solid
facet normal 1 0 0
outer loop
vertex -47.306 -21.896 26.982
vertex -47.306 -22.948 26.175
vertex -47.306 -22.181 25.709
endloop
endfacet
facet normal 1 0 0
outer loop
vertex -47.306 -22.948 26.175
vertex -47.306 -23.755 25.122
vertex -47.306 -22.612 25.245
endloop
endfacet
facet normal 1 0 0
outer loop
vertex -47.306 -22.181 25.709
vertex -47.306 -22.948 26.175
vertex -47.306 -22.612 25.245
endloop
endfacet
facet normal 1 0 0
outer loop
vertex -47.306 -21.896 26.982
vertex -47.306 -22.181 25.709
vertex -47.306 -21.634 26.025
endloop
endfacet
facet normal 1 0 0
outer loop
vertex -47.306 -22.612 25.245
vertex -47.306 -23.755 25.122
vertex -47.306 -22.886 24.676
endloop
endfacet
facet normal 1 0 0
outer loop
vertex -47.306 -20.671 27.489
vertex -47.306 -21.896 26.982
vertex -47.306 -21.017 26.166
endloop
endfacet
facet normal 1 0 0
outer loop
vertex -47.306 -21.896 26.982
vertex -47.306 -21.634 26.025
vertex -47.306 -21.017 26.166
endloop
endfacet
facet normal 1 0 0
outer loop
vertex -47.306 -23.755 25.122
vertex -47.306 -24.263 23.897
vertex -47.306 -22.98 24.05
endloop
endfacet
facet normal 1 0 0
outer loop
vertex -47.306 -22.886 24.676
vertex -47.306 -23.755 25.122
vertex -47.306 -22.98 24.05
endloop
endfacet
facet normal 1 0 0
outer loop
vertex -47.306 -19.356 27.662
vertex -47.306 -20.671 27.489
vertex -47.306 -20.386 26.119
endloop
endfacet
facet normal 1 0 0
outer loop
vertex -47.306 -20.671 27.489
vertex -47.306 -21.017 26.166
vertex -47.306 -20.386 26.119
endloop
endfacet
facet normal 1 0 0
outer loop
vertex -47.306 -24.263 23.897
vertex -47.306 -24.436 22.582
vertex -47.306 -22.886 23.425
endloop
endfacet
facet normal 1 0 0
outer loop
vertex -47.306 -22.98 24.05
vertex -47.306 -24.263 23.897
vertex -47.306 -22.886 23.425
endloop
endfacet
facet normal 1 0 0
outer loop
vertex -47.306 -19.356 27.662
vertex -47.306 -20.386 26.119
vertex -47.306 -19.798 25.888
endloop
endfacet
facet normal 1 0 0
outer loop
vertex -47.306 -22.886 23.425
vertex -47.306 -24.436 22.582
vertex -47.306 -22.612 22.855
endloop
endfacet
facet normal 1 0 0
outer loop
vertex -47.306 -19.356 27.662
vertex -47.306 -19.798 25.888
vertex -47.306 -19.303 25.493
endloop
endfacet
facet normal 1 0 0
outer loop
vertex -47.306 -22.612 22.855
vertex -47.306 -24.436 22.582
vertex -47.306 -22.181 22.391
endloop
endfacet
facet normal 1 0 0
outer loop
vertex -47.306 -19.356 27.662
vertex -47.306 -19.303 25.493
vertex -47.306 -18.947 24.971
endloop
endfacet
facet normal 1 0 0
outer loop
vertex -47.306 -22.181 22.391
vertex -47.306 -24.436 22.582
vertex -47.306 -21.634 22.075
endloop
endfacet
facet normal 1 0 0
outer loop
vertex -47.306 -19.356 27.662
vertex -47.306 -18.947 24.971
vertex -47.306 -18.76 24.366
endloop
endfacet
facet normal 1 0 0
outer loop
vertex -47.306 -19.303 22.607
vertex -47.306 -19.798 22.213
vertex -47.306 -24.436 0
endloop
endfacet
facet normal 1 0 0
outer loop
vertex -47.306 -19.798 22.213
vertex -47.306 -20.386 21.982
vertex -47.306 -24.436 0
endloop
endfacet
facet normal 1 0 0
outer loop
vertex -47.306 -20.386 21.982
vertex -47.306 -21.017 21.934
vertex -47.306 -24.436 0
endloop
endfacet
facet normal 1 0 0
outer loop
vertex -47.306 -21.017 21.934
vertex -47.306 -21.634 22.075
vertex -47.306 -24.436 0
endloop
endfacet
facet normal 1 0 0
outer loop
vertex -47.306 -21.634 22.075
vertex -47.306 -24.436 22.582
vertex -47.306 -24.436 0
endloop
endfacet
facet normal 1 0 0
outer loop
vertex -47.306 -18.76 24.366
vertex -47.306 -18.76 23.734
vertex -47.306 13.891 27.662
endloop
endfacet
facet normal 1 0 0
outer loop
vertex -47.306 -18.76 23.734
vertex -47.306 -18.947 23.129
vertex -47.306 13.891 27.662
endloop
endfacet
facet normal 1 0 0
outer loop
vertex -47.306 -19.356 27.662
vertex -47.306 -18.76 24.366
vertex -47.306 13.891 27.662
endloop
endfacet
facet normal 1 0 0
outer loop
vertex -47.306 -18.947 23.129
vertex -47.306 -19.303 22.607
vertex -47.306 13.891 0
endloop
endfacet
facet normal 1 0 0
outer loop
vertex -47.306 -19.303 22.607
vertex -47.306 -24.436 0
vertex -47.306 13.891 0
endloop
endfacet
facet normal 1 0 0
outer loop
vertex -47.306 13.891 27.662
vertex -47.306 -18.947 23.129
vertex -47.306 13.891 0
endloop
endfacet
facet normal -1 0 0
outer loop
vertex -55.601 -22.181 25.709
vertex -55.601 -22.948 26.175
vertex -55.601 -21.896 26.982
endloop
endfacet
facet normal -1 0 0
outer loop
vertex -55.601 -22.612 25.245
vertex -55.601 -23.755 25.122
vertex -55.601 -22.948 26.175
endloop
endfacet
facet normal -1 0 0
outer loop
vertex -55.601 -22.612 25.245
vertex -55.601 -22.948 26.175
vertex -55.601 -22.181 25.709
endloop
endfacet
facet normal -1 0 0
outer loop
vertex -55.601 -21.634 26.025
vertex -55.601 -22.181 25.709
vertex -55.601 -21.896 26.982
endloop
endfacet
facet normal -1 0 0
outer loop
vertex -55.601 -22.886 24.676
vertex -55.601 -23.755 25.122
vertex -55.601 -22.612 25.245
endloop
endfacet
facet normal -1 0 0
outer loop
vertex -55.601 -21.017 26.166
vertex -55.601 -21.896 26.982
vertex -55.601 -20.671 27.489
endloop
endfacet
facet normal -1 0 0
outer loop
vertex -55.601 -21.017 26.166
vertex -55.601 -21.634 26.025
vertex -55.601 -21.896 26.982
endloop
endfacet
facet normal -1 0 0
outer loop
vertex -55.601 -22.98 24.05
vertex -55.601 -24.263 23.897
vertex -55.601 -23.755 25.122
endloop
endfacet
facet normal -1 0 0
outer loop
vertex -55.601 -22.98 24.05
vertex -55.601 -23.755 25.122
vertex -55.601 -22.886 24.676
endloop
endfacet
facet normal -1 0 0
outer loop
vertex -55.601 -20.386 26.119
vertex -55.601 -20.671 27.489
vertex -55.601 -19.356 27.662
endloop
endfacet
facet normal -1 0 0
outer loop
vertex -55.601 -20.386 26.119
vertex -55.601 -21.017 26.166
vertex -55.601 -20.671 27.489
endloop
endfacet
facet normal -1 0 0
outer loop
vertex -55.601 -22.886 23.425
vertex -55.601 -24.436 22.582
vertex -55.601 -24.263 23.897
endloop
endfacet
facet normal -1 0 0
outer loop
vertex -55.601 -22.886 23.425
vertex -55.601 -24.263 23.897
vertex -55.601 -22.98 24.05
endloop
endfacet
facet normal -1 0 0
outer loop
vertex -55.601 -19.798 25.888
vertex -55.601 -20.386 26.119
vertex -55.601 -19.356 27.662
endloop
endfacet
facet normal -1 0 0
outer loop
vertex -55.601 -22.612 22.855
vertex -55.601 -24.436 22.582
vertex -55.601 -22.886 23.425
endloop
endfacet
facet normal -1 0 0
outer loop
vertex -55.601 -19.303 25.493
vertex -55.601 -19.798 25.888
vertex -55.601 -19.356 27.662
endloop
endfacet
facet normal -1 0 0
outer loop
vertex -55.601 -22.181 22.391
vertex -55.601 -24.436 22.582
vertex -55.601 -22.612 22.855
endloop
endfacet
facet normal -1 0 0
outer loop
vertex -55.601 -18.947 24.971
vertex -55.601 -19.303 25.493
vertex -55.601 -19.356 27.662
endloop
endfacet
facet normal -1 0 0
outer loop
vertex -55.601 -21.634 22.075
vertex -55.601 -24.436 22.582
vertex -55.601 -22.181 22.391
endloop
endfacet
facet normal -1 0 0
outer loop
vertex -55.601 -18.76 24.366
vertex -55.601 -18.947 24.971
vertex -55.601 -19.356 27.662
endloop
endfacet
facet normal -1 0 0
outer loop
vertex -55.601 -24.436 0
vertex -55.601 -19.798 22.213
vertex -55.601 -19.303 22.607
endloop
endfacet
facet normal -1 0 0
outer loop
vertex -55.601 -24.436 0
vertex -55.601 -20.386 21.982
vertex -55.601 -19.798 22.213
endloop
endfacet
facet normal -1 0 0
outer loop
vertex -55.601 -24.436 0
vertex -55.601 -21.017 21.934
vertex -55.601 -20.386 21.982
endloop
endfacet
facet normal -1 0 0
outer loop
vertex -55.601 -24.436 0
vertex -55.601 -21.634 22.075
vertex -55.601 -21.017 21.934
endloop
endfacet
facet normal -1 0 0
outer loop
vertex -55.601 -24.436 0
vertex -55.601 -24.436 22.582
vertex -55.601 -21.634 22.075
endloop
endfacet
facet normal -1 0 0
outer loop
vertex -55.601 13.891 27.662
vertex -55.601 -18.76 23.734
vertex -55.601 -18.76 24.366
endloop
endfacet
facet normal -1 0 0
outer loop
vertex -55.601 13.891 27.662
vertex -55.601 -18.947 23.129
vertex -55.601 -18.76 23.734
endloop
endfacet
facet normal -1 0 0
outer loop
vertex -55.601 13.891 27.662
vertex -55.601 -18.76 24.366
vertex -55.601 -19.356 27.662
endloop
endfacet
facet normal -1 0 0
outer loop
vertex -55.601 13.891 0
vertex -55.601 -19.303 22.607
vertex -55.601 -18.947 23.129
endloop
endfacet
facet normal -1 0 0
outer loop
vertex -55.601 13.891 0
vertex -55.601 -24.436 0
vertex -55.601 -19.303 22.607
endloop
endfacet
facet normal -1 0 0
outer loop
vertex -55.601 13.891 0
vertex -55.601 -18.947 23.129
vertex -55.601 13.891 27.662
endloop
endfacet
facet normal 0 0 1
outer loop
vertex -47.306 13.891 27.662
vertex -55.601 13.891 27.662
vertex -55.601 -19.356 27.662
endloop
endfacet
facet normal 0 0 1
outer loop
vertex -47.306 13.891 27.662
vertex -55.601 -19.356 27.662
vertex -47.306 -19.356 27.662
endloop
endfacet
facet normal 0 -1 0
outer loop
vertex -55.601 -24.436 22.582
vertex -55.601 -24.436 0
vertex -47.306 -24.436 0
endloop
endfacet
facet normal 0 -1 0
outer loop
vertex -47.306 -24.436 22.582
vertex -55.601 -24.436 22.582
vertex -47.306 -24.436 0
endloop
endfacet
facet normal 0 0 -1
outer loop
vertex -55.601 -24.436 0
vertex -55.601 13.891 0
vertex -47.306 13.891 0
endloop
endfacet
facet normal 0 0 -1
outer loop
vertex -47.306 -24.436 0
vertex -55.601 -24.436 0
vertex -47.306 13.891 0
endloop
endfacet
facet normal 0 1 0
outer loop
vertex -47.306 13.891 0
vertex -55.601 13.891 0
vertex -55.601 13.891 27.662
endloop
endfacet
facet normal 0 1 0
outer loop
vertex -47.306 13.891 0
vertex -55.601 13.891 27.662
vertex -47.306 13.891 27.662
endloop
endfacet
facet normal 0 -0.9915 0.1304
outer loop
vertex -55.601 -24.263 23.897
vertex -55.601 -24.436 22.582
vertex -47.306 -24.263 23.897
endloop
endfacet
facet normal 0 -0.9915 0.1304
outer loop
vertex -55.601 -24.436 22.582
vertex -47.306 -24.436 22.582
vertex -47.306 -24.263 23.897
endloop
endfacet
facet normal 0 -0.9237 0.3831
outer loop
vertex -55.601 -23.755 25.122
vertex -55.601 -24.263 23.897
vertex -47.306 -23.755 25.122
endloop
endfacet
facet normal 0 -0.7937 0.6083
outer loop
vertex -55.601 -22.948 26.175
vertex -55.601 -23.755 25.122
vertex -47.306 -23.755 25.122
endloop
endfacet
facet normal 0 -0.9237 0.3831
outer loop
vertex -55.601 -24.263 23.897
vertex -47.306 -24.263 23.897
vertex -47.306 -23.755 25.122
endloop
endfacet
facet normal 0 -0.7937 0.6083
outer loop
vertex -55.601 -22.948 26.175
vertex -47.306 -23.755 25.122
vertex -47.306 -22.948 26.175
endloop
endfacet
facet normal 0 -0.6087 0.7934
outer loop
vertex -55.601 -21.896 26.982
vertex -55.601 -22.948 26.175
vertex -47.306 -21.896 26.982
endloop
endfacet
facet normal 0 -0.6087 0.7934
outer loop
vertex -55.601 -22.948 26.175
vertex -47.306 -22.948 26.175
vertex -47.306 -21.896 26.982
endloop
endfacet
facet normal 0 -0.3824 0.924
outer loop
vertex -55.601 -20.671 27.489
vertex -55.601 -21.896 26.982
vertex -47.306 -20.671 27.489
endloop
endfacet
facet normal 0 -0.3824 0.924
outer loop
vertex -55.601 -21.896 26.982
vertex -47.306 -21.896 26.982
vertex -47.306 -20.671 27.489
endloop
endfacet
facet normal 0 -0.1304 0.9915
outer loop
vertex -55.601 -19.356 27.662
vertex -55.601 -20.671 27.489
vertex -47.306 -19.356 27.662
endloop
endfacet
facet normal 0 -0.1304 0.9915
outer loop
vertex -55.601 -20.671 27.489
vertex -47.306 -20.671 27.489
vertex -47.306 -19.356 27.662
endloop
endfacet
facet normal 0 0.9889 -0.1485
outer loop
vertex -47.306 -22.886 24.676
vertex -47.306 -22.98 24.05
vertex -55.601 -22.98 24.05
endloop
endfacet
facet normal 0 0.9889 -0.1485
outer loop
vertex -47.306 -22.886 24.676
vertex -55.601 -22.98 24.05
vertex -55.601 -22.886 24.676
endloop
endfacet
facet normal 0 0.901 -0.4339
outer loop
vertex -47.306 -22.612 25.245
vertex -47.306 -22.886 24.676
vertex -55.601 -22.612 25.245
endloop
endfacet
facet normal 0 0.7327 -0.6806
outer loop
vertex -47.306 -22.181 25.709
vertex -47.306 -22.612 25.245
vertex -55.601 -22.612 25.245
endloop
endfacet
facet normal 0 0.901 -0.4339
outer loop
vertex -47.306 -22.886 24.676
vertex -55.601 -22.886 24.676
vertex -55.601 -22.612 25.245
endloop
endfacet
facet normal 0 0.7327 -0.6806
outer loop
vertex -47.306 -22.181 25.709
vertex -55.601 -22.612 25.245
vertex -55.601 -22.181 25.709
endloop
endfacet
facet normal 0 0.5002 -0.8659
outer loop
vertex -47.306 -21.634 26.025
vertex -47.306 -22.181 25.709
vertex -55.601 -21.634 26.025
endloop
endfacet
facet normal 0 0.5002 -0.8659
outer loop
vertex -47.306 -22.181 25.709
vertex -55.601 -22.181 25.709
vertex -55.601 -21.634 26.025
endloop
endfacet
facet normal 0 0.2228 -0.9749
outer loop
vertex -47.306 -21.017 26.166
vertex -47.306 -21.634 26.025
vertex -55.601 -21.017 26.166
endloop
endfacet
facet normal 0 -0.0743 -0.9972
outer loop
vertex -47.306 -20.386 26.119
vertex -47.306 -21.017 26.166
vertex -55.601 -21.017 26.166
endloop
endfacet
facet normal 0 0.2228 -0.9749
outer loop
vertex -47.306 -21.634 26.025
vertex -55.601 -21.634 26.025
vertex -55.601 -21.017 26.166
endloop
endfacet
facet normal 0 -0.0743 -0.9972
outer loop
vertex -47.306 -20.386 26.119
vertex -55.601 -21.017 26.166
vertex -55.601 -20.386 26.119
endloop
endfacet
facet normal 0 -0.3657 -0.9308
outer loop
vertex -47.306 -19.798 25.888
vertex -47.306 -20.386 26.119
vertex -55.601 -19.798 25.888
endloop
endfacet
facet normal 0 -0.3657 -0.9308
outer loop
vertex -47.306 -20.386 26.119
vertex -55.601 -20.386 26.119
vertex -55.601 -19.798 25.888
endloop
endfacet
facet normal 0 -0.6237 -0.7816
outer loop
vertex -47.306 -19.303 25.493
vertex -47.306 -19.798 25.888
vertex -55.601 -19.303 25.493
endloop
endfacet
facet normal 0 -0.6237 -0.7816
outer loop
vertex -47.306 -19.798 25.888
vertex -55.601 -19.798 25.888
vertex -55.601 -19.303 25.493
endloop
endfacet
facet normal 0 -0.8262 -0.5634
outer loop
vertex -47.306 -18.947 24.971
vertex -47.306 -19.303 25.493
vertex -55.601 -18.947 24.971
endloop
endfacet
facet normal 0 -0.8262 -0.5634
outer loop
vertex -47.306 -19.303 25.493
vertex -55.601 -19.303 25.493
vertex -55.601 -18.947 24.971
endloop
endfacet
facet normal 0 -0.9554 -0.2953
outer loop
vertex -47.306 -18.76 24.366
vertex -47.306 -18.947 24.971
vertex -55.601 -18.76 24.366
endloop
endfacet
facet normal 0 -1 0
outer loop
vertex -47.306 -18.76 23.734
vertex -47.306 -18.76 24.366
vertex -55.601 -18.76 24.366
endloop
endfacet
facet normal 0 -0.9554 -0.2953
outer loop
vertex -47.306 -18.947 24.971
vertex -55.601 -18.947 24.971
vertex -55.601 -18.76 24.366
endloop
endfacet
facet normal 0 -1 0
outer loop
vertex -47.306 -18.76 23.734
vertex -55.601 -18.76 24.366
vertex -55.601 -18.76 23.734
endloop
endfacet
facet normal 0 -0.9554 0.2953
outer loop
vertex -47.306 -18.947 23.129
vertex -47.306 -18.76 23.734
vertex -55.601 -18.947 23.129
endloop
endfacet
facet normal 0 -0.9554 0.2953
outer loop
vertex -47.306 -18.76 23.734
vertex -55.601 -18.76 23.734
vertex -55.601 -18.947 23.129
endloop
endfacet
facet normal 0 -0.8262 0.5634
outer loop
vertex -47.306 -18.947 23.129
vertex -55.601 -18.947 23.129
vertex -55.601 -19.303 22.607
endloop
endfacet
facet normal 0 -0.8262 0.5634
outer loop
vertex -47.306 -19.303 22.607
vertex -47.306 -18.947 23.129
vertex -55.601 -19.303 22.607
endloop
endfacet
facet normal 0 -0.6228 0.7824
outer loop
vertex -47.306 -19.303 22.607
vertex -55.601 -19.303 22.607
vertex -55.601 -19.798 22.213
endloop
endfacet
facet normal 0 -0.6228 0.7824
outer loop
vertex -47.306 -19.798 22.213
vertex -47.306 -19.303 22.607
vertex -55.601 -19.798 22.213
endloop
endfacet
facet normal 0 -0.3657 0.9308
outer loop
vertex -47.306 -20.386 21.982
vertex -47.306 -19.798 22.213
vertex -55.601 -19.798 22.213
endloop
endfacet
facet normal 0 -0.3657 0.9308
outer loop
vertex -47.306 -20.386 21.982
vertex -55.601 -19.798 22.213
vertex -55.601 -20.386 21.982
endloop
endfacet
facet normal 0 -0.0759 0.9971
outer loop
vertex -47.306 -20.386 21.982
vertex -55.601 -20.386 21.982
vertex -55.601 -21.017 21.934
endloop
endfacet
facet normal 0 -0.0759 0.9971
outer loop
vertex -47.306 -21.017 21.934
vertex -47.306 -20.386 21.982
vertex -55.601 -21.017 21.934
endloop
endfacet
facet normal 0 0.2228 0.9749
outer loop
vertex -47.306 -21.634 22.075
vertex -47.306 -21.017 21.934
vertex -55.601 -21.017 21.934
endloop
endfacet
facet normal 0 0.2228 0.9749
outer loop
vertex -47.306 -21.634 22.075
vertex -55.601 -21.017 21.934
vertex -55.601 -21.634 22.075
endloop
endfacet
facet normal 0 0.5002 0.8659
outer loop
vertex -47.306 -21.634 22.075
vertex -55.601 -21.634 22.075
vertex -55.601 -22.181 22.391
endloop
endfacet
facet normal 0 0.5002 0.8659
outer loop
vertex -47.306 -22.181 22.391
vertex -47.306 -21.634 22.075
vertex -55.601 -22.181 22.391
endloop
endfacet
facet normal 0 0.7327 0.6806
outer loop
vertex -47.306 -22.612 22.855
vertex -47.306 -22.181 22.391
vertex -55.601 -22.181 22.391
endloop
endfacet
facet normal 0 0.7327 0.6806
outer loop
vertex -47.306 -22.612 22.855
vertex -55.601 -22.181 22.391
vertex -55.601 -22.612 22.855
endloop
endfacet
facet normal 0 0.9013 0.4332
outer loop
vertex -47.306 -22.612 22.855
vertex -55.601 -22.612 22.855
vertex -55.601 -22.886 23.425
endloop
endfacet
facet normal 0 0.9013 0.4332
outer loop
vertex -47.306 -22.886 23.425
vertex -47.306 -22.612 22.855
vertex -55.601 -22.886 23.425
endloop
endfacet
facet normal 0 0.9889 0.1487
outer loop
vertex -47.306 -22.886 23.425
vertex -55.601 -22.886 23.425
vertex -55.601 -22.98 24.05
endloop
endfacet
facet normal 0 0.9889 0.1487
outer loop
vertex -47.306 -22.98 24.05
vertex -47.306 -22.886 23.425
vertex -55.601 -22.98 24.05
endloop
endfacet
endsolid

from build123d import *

# Parameters (mm, degrees)
F0_W     = 8.295227
F0_H     = 38.326367
F1_DEPTH = 27.662443
F2_R     = 5.08
F3_R     = 2.121776
F4_DEPTH = 25.4


with BuildPart() as f1:
    # F0 (on Top) → F1 (new body)
    with BuildSketch(Plane.XY):
        with Locations((-51.453689, -5.27262)):
            Rectangle(F0_W, F0_H)
    extrude(amount=F1_DEPTH)

    # F2
    f2_edges = [f1.edges().sort_by_distance(p)[0] for p in [
        (-51.453689, -24.435803, 27.662443),
    ]]
    fillet(f2_edges, radius=F2_R)

    # F3 (on face) → F4 (cut)
    with BuildSketch(Plane(origin=(-55.601303, 0, 0), x_dir=(0, -1, 0), z_dir=(-1, 0, 0))):
        with Locations((20.858478, 24.050102)):
            Circle(F3_R)
    extrude(amount=-F4_DEPTH, mode=Mode.SUBTRACT)


solid = f1.part
